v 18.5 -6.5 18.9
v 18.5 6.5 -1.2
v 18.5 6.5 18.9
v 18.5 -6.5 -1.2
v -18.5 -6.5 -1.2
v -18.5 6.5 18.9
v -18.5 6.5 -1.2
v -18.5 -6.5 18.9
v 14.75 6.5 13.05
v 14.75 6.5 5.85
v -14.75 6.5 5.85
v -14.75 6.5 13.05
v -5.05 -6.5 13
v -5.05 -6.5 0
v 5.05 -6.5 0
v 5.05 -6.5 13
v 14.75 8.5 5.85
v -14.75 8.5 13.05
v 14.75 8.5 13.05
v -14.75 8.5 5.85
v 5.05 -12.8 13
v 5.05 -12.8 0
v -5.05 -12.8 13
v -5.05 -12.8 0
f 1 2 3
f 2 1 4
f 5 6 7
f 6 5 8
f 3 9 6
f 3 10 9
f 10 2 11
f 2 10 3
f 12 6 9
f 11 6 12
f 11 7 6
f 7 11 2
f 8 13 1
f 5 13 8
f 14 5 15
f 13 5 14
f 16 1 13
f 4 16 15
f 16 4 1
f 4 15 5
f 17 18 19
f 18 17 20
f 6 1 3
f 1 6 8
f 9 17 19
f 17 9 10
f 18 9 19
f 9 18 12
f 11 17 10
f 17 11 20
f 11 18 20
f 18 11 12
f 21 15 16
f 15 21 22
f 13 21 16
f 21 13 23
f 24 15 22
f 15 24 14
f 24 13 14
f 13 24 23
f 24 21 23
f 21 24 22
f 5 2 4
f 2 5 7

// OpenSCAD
// Sharp GP2Y0A21YK0F 測距センサ OpenSCAD モデル
// 単位: mm
// 座標系: 本体中心を原点 (X:幅方向, Y:奥行き方向, Z:高さ方向)
//         取付面(PWB/コネクタ側)を -Z に向ける。

$fn = 50;

module gp2y0a21yk0f() {
    // --- 1. メインケース (黒色樹脂部) ---
    // 寸法: 幅 37mm, 奥行き 13mm, 高さ 21.6mm (全体高さ 18.9 + PWB厚 1.2 から推定)
    // 原点基準で配置
    color("#222222")
    translate([-37/2, -13/2, 0])
        cube([37, 13, 18.9]);

    // --- 2. 取付耳 (両サイドの穴付きタブ) ---
    // 全長 29.5mm 間隔の取付穴 (φ3.2)
    color("#222222")
    difference() {
        // タブ全体のベース
        translate([-37/2, -13/2, 0])
            cube([37, 13, 2.0]);
        
        // 左取付穴 (中心から -14.75の位置)
        translate([-29.5/2, 0, -1])
            cylinder(d=3.2, h=4);
            
        // 右取付穴 (中心から +14.75の位置)
        translate([29.5/2, 0, -1])
            cylinder(d=3.2, h=4);
    }

    // --- 3. レンズ部 (前面の突出部分) ---
    // 正面 (Y = +6.5) に突出
    color("#111111")
    translate([-29.5/2, 6.5, (18.9 - 7.2)/2])
        cube([29.5, 2.0, 7.2]);

    // 発光部・受光部レンズ (円柱表現)
    // 20mm 間隔
    color("#880000") {
        // Light emitter (左)
        translate([-20/2, 6.5 + 2.0, 18.9/2])
            rotate([90, 0, 0])
                cylinder(d=6, h=1);
                
        // Light detector (右)
        translate([20/2, 6.5 + 2.0, 18.9/2])
            rotate([90, 0, 0])
                cylinder(d=6, h=1);
    }

    // --- 4. 背面コネクタ (JST / 相当品) ---
    // 背面 (Y = -13/2) に突き出し
    color("#dddddd")
    translate([-10.1/2, -13/2 - 6.3, 0])
        cube([10.1, 6.3, 13]);

    // --- 5. PWB (基板) ---
    // 厚み 1.2mm, 下部に配置
    color("#2b542c") // 基板グリーン
    translate([-37/2, -13/2, -1.2])
        cube([37, 13, 1.2]);
}

// プレビュー表示
gp2y0a21yk0f();
